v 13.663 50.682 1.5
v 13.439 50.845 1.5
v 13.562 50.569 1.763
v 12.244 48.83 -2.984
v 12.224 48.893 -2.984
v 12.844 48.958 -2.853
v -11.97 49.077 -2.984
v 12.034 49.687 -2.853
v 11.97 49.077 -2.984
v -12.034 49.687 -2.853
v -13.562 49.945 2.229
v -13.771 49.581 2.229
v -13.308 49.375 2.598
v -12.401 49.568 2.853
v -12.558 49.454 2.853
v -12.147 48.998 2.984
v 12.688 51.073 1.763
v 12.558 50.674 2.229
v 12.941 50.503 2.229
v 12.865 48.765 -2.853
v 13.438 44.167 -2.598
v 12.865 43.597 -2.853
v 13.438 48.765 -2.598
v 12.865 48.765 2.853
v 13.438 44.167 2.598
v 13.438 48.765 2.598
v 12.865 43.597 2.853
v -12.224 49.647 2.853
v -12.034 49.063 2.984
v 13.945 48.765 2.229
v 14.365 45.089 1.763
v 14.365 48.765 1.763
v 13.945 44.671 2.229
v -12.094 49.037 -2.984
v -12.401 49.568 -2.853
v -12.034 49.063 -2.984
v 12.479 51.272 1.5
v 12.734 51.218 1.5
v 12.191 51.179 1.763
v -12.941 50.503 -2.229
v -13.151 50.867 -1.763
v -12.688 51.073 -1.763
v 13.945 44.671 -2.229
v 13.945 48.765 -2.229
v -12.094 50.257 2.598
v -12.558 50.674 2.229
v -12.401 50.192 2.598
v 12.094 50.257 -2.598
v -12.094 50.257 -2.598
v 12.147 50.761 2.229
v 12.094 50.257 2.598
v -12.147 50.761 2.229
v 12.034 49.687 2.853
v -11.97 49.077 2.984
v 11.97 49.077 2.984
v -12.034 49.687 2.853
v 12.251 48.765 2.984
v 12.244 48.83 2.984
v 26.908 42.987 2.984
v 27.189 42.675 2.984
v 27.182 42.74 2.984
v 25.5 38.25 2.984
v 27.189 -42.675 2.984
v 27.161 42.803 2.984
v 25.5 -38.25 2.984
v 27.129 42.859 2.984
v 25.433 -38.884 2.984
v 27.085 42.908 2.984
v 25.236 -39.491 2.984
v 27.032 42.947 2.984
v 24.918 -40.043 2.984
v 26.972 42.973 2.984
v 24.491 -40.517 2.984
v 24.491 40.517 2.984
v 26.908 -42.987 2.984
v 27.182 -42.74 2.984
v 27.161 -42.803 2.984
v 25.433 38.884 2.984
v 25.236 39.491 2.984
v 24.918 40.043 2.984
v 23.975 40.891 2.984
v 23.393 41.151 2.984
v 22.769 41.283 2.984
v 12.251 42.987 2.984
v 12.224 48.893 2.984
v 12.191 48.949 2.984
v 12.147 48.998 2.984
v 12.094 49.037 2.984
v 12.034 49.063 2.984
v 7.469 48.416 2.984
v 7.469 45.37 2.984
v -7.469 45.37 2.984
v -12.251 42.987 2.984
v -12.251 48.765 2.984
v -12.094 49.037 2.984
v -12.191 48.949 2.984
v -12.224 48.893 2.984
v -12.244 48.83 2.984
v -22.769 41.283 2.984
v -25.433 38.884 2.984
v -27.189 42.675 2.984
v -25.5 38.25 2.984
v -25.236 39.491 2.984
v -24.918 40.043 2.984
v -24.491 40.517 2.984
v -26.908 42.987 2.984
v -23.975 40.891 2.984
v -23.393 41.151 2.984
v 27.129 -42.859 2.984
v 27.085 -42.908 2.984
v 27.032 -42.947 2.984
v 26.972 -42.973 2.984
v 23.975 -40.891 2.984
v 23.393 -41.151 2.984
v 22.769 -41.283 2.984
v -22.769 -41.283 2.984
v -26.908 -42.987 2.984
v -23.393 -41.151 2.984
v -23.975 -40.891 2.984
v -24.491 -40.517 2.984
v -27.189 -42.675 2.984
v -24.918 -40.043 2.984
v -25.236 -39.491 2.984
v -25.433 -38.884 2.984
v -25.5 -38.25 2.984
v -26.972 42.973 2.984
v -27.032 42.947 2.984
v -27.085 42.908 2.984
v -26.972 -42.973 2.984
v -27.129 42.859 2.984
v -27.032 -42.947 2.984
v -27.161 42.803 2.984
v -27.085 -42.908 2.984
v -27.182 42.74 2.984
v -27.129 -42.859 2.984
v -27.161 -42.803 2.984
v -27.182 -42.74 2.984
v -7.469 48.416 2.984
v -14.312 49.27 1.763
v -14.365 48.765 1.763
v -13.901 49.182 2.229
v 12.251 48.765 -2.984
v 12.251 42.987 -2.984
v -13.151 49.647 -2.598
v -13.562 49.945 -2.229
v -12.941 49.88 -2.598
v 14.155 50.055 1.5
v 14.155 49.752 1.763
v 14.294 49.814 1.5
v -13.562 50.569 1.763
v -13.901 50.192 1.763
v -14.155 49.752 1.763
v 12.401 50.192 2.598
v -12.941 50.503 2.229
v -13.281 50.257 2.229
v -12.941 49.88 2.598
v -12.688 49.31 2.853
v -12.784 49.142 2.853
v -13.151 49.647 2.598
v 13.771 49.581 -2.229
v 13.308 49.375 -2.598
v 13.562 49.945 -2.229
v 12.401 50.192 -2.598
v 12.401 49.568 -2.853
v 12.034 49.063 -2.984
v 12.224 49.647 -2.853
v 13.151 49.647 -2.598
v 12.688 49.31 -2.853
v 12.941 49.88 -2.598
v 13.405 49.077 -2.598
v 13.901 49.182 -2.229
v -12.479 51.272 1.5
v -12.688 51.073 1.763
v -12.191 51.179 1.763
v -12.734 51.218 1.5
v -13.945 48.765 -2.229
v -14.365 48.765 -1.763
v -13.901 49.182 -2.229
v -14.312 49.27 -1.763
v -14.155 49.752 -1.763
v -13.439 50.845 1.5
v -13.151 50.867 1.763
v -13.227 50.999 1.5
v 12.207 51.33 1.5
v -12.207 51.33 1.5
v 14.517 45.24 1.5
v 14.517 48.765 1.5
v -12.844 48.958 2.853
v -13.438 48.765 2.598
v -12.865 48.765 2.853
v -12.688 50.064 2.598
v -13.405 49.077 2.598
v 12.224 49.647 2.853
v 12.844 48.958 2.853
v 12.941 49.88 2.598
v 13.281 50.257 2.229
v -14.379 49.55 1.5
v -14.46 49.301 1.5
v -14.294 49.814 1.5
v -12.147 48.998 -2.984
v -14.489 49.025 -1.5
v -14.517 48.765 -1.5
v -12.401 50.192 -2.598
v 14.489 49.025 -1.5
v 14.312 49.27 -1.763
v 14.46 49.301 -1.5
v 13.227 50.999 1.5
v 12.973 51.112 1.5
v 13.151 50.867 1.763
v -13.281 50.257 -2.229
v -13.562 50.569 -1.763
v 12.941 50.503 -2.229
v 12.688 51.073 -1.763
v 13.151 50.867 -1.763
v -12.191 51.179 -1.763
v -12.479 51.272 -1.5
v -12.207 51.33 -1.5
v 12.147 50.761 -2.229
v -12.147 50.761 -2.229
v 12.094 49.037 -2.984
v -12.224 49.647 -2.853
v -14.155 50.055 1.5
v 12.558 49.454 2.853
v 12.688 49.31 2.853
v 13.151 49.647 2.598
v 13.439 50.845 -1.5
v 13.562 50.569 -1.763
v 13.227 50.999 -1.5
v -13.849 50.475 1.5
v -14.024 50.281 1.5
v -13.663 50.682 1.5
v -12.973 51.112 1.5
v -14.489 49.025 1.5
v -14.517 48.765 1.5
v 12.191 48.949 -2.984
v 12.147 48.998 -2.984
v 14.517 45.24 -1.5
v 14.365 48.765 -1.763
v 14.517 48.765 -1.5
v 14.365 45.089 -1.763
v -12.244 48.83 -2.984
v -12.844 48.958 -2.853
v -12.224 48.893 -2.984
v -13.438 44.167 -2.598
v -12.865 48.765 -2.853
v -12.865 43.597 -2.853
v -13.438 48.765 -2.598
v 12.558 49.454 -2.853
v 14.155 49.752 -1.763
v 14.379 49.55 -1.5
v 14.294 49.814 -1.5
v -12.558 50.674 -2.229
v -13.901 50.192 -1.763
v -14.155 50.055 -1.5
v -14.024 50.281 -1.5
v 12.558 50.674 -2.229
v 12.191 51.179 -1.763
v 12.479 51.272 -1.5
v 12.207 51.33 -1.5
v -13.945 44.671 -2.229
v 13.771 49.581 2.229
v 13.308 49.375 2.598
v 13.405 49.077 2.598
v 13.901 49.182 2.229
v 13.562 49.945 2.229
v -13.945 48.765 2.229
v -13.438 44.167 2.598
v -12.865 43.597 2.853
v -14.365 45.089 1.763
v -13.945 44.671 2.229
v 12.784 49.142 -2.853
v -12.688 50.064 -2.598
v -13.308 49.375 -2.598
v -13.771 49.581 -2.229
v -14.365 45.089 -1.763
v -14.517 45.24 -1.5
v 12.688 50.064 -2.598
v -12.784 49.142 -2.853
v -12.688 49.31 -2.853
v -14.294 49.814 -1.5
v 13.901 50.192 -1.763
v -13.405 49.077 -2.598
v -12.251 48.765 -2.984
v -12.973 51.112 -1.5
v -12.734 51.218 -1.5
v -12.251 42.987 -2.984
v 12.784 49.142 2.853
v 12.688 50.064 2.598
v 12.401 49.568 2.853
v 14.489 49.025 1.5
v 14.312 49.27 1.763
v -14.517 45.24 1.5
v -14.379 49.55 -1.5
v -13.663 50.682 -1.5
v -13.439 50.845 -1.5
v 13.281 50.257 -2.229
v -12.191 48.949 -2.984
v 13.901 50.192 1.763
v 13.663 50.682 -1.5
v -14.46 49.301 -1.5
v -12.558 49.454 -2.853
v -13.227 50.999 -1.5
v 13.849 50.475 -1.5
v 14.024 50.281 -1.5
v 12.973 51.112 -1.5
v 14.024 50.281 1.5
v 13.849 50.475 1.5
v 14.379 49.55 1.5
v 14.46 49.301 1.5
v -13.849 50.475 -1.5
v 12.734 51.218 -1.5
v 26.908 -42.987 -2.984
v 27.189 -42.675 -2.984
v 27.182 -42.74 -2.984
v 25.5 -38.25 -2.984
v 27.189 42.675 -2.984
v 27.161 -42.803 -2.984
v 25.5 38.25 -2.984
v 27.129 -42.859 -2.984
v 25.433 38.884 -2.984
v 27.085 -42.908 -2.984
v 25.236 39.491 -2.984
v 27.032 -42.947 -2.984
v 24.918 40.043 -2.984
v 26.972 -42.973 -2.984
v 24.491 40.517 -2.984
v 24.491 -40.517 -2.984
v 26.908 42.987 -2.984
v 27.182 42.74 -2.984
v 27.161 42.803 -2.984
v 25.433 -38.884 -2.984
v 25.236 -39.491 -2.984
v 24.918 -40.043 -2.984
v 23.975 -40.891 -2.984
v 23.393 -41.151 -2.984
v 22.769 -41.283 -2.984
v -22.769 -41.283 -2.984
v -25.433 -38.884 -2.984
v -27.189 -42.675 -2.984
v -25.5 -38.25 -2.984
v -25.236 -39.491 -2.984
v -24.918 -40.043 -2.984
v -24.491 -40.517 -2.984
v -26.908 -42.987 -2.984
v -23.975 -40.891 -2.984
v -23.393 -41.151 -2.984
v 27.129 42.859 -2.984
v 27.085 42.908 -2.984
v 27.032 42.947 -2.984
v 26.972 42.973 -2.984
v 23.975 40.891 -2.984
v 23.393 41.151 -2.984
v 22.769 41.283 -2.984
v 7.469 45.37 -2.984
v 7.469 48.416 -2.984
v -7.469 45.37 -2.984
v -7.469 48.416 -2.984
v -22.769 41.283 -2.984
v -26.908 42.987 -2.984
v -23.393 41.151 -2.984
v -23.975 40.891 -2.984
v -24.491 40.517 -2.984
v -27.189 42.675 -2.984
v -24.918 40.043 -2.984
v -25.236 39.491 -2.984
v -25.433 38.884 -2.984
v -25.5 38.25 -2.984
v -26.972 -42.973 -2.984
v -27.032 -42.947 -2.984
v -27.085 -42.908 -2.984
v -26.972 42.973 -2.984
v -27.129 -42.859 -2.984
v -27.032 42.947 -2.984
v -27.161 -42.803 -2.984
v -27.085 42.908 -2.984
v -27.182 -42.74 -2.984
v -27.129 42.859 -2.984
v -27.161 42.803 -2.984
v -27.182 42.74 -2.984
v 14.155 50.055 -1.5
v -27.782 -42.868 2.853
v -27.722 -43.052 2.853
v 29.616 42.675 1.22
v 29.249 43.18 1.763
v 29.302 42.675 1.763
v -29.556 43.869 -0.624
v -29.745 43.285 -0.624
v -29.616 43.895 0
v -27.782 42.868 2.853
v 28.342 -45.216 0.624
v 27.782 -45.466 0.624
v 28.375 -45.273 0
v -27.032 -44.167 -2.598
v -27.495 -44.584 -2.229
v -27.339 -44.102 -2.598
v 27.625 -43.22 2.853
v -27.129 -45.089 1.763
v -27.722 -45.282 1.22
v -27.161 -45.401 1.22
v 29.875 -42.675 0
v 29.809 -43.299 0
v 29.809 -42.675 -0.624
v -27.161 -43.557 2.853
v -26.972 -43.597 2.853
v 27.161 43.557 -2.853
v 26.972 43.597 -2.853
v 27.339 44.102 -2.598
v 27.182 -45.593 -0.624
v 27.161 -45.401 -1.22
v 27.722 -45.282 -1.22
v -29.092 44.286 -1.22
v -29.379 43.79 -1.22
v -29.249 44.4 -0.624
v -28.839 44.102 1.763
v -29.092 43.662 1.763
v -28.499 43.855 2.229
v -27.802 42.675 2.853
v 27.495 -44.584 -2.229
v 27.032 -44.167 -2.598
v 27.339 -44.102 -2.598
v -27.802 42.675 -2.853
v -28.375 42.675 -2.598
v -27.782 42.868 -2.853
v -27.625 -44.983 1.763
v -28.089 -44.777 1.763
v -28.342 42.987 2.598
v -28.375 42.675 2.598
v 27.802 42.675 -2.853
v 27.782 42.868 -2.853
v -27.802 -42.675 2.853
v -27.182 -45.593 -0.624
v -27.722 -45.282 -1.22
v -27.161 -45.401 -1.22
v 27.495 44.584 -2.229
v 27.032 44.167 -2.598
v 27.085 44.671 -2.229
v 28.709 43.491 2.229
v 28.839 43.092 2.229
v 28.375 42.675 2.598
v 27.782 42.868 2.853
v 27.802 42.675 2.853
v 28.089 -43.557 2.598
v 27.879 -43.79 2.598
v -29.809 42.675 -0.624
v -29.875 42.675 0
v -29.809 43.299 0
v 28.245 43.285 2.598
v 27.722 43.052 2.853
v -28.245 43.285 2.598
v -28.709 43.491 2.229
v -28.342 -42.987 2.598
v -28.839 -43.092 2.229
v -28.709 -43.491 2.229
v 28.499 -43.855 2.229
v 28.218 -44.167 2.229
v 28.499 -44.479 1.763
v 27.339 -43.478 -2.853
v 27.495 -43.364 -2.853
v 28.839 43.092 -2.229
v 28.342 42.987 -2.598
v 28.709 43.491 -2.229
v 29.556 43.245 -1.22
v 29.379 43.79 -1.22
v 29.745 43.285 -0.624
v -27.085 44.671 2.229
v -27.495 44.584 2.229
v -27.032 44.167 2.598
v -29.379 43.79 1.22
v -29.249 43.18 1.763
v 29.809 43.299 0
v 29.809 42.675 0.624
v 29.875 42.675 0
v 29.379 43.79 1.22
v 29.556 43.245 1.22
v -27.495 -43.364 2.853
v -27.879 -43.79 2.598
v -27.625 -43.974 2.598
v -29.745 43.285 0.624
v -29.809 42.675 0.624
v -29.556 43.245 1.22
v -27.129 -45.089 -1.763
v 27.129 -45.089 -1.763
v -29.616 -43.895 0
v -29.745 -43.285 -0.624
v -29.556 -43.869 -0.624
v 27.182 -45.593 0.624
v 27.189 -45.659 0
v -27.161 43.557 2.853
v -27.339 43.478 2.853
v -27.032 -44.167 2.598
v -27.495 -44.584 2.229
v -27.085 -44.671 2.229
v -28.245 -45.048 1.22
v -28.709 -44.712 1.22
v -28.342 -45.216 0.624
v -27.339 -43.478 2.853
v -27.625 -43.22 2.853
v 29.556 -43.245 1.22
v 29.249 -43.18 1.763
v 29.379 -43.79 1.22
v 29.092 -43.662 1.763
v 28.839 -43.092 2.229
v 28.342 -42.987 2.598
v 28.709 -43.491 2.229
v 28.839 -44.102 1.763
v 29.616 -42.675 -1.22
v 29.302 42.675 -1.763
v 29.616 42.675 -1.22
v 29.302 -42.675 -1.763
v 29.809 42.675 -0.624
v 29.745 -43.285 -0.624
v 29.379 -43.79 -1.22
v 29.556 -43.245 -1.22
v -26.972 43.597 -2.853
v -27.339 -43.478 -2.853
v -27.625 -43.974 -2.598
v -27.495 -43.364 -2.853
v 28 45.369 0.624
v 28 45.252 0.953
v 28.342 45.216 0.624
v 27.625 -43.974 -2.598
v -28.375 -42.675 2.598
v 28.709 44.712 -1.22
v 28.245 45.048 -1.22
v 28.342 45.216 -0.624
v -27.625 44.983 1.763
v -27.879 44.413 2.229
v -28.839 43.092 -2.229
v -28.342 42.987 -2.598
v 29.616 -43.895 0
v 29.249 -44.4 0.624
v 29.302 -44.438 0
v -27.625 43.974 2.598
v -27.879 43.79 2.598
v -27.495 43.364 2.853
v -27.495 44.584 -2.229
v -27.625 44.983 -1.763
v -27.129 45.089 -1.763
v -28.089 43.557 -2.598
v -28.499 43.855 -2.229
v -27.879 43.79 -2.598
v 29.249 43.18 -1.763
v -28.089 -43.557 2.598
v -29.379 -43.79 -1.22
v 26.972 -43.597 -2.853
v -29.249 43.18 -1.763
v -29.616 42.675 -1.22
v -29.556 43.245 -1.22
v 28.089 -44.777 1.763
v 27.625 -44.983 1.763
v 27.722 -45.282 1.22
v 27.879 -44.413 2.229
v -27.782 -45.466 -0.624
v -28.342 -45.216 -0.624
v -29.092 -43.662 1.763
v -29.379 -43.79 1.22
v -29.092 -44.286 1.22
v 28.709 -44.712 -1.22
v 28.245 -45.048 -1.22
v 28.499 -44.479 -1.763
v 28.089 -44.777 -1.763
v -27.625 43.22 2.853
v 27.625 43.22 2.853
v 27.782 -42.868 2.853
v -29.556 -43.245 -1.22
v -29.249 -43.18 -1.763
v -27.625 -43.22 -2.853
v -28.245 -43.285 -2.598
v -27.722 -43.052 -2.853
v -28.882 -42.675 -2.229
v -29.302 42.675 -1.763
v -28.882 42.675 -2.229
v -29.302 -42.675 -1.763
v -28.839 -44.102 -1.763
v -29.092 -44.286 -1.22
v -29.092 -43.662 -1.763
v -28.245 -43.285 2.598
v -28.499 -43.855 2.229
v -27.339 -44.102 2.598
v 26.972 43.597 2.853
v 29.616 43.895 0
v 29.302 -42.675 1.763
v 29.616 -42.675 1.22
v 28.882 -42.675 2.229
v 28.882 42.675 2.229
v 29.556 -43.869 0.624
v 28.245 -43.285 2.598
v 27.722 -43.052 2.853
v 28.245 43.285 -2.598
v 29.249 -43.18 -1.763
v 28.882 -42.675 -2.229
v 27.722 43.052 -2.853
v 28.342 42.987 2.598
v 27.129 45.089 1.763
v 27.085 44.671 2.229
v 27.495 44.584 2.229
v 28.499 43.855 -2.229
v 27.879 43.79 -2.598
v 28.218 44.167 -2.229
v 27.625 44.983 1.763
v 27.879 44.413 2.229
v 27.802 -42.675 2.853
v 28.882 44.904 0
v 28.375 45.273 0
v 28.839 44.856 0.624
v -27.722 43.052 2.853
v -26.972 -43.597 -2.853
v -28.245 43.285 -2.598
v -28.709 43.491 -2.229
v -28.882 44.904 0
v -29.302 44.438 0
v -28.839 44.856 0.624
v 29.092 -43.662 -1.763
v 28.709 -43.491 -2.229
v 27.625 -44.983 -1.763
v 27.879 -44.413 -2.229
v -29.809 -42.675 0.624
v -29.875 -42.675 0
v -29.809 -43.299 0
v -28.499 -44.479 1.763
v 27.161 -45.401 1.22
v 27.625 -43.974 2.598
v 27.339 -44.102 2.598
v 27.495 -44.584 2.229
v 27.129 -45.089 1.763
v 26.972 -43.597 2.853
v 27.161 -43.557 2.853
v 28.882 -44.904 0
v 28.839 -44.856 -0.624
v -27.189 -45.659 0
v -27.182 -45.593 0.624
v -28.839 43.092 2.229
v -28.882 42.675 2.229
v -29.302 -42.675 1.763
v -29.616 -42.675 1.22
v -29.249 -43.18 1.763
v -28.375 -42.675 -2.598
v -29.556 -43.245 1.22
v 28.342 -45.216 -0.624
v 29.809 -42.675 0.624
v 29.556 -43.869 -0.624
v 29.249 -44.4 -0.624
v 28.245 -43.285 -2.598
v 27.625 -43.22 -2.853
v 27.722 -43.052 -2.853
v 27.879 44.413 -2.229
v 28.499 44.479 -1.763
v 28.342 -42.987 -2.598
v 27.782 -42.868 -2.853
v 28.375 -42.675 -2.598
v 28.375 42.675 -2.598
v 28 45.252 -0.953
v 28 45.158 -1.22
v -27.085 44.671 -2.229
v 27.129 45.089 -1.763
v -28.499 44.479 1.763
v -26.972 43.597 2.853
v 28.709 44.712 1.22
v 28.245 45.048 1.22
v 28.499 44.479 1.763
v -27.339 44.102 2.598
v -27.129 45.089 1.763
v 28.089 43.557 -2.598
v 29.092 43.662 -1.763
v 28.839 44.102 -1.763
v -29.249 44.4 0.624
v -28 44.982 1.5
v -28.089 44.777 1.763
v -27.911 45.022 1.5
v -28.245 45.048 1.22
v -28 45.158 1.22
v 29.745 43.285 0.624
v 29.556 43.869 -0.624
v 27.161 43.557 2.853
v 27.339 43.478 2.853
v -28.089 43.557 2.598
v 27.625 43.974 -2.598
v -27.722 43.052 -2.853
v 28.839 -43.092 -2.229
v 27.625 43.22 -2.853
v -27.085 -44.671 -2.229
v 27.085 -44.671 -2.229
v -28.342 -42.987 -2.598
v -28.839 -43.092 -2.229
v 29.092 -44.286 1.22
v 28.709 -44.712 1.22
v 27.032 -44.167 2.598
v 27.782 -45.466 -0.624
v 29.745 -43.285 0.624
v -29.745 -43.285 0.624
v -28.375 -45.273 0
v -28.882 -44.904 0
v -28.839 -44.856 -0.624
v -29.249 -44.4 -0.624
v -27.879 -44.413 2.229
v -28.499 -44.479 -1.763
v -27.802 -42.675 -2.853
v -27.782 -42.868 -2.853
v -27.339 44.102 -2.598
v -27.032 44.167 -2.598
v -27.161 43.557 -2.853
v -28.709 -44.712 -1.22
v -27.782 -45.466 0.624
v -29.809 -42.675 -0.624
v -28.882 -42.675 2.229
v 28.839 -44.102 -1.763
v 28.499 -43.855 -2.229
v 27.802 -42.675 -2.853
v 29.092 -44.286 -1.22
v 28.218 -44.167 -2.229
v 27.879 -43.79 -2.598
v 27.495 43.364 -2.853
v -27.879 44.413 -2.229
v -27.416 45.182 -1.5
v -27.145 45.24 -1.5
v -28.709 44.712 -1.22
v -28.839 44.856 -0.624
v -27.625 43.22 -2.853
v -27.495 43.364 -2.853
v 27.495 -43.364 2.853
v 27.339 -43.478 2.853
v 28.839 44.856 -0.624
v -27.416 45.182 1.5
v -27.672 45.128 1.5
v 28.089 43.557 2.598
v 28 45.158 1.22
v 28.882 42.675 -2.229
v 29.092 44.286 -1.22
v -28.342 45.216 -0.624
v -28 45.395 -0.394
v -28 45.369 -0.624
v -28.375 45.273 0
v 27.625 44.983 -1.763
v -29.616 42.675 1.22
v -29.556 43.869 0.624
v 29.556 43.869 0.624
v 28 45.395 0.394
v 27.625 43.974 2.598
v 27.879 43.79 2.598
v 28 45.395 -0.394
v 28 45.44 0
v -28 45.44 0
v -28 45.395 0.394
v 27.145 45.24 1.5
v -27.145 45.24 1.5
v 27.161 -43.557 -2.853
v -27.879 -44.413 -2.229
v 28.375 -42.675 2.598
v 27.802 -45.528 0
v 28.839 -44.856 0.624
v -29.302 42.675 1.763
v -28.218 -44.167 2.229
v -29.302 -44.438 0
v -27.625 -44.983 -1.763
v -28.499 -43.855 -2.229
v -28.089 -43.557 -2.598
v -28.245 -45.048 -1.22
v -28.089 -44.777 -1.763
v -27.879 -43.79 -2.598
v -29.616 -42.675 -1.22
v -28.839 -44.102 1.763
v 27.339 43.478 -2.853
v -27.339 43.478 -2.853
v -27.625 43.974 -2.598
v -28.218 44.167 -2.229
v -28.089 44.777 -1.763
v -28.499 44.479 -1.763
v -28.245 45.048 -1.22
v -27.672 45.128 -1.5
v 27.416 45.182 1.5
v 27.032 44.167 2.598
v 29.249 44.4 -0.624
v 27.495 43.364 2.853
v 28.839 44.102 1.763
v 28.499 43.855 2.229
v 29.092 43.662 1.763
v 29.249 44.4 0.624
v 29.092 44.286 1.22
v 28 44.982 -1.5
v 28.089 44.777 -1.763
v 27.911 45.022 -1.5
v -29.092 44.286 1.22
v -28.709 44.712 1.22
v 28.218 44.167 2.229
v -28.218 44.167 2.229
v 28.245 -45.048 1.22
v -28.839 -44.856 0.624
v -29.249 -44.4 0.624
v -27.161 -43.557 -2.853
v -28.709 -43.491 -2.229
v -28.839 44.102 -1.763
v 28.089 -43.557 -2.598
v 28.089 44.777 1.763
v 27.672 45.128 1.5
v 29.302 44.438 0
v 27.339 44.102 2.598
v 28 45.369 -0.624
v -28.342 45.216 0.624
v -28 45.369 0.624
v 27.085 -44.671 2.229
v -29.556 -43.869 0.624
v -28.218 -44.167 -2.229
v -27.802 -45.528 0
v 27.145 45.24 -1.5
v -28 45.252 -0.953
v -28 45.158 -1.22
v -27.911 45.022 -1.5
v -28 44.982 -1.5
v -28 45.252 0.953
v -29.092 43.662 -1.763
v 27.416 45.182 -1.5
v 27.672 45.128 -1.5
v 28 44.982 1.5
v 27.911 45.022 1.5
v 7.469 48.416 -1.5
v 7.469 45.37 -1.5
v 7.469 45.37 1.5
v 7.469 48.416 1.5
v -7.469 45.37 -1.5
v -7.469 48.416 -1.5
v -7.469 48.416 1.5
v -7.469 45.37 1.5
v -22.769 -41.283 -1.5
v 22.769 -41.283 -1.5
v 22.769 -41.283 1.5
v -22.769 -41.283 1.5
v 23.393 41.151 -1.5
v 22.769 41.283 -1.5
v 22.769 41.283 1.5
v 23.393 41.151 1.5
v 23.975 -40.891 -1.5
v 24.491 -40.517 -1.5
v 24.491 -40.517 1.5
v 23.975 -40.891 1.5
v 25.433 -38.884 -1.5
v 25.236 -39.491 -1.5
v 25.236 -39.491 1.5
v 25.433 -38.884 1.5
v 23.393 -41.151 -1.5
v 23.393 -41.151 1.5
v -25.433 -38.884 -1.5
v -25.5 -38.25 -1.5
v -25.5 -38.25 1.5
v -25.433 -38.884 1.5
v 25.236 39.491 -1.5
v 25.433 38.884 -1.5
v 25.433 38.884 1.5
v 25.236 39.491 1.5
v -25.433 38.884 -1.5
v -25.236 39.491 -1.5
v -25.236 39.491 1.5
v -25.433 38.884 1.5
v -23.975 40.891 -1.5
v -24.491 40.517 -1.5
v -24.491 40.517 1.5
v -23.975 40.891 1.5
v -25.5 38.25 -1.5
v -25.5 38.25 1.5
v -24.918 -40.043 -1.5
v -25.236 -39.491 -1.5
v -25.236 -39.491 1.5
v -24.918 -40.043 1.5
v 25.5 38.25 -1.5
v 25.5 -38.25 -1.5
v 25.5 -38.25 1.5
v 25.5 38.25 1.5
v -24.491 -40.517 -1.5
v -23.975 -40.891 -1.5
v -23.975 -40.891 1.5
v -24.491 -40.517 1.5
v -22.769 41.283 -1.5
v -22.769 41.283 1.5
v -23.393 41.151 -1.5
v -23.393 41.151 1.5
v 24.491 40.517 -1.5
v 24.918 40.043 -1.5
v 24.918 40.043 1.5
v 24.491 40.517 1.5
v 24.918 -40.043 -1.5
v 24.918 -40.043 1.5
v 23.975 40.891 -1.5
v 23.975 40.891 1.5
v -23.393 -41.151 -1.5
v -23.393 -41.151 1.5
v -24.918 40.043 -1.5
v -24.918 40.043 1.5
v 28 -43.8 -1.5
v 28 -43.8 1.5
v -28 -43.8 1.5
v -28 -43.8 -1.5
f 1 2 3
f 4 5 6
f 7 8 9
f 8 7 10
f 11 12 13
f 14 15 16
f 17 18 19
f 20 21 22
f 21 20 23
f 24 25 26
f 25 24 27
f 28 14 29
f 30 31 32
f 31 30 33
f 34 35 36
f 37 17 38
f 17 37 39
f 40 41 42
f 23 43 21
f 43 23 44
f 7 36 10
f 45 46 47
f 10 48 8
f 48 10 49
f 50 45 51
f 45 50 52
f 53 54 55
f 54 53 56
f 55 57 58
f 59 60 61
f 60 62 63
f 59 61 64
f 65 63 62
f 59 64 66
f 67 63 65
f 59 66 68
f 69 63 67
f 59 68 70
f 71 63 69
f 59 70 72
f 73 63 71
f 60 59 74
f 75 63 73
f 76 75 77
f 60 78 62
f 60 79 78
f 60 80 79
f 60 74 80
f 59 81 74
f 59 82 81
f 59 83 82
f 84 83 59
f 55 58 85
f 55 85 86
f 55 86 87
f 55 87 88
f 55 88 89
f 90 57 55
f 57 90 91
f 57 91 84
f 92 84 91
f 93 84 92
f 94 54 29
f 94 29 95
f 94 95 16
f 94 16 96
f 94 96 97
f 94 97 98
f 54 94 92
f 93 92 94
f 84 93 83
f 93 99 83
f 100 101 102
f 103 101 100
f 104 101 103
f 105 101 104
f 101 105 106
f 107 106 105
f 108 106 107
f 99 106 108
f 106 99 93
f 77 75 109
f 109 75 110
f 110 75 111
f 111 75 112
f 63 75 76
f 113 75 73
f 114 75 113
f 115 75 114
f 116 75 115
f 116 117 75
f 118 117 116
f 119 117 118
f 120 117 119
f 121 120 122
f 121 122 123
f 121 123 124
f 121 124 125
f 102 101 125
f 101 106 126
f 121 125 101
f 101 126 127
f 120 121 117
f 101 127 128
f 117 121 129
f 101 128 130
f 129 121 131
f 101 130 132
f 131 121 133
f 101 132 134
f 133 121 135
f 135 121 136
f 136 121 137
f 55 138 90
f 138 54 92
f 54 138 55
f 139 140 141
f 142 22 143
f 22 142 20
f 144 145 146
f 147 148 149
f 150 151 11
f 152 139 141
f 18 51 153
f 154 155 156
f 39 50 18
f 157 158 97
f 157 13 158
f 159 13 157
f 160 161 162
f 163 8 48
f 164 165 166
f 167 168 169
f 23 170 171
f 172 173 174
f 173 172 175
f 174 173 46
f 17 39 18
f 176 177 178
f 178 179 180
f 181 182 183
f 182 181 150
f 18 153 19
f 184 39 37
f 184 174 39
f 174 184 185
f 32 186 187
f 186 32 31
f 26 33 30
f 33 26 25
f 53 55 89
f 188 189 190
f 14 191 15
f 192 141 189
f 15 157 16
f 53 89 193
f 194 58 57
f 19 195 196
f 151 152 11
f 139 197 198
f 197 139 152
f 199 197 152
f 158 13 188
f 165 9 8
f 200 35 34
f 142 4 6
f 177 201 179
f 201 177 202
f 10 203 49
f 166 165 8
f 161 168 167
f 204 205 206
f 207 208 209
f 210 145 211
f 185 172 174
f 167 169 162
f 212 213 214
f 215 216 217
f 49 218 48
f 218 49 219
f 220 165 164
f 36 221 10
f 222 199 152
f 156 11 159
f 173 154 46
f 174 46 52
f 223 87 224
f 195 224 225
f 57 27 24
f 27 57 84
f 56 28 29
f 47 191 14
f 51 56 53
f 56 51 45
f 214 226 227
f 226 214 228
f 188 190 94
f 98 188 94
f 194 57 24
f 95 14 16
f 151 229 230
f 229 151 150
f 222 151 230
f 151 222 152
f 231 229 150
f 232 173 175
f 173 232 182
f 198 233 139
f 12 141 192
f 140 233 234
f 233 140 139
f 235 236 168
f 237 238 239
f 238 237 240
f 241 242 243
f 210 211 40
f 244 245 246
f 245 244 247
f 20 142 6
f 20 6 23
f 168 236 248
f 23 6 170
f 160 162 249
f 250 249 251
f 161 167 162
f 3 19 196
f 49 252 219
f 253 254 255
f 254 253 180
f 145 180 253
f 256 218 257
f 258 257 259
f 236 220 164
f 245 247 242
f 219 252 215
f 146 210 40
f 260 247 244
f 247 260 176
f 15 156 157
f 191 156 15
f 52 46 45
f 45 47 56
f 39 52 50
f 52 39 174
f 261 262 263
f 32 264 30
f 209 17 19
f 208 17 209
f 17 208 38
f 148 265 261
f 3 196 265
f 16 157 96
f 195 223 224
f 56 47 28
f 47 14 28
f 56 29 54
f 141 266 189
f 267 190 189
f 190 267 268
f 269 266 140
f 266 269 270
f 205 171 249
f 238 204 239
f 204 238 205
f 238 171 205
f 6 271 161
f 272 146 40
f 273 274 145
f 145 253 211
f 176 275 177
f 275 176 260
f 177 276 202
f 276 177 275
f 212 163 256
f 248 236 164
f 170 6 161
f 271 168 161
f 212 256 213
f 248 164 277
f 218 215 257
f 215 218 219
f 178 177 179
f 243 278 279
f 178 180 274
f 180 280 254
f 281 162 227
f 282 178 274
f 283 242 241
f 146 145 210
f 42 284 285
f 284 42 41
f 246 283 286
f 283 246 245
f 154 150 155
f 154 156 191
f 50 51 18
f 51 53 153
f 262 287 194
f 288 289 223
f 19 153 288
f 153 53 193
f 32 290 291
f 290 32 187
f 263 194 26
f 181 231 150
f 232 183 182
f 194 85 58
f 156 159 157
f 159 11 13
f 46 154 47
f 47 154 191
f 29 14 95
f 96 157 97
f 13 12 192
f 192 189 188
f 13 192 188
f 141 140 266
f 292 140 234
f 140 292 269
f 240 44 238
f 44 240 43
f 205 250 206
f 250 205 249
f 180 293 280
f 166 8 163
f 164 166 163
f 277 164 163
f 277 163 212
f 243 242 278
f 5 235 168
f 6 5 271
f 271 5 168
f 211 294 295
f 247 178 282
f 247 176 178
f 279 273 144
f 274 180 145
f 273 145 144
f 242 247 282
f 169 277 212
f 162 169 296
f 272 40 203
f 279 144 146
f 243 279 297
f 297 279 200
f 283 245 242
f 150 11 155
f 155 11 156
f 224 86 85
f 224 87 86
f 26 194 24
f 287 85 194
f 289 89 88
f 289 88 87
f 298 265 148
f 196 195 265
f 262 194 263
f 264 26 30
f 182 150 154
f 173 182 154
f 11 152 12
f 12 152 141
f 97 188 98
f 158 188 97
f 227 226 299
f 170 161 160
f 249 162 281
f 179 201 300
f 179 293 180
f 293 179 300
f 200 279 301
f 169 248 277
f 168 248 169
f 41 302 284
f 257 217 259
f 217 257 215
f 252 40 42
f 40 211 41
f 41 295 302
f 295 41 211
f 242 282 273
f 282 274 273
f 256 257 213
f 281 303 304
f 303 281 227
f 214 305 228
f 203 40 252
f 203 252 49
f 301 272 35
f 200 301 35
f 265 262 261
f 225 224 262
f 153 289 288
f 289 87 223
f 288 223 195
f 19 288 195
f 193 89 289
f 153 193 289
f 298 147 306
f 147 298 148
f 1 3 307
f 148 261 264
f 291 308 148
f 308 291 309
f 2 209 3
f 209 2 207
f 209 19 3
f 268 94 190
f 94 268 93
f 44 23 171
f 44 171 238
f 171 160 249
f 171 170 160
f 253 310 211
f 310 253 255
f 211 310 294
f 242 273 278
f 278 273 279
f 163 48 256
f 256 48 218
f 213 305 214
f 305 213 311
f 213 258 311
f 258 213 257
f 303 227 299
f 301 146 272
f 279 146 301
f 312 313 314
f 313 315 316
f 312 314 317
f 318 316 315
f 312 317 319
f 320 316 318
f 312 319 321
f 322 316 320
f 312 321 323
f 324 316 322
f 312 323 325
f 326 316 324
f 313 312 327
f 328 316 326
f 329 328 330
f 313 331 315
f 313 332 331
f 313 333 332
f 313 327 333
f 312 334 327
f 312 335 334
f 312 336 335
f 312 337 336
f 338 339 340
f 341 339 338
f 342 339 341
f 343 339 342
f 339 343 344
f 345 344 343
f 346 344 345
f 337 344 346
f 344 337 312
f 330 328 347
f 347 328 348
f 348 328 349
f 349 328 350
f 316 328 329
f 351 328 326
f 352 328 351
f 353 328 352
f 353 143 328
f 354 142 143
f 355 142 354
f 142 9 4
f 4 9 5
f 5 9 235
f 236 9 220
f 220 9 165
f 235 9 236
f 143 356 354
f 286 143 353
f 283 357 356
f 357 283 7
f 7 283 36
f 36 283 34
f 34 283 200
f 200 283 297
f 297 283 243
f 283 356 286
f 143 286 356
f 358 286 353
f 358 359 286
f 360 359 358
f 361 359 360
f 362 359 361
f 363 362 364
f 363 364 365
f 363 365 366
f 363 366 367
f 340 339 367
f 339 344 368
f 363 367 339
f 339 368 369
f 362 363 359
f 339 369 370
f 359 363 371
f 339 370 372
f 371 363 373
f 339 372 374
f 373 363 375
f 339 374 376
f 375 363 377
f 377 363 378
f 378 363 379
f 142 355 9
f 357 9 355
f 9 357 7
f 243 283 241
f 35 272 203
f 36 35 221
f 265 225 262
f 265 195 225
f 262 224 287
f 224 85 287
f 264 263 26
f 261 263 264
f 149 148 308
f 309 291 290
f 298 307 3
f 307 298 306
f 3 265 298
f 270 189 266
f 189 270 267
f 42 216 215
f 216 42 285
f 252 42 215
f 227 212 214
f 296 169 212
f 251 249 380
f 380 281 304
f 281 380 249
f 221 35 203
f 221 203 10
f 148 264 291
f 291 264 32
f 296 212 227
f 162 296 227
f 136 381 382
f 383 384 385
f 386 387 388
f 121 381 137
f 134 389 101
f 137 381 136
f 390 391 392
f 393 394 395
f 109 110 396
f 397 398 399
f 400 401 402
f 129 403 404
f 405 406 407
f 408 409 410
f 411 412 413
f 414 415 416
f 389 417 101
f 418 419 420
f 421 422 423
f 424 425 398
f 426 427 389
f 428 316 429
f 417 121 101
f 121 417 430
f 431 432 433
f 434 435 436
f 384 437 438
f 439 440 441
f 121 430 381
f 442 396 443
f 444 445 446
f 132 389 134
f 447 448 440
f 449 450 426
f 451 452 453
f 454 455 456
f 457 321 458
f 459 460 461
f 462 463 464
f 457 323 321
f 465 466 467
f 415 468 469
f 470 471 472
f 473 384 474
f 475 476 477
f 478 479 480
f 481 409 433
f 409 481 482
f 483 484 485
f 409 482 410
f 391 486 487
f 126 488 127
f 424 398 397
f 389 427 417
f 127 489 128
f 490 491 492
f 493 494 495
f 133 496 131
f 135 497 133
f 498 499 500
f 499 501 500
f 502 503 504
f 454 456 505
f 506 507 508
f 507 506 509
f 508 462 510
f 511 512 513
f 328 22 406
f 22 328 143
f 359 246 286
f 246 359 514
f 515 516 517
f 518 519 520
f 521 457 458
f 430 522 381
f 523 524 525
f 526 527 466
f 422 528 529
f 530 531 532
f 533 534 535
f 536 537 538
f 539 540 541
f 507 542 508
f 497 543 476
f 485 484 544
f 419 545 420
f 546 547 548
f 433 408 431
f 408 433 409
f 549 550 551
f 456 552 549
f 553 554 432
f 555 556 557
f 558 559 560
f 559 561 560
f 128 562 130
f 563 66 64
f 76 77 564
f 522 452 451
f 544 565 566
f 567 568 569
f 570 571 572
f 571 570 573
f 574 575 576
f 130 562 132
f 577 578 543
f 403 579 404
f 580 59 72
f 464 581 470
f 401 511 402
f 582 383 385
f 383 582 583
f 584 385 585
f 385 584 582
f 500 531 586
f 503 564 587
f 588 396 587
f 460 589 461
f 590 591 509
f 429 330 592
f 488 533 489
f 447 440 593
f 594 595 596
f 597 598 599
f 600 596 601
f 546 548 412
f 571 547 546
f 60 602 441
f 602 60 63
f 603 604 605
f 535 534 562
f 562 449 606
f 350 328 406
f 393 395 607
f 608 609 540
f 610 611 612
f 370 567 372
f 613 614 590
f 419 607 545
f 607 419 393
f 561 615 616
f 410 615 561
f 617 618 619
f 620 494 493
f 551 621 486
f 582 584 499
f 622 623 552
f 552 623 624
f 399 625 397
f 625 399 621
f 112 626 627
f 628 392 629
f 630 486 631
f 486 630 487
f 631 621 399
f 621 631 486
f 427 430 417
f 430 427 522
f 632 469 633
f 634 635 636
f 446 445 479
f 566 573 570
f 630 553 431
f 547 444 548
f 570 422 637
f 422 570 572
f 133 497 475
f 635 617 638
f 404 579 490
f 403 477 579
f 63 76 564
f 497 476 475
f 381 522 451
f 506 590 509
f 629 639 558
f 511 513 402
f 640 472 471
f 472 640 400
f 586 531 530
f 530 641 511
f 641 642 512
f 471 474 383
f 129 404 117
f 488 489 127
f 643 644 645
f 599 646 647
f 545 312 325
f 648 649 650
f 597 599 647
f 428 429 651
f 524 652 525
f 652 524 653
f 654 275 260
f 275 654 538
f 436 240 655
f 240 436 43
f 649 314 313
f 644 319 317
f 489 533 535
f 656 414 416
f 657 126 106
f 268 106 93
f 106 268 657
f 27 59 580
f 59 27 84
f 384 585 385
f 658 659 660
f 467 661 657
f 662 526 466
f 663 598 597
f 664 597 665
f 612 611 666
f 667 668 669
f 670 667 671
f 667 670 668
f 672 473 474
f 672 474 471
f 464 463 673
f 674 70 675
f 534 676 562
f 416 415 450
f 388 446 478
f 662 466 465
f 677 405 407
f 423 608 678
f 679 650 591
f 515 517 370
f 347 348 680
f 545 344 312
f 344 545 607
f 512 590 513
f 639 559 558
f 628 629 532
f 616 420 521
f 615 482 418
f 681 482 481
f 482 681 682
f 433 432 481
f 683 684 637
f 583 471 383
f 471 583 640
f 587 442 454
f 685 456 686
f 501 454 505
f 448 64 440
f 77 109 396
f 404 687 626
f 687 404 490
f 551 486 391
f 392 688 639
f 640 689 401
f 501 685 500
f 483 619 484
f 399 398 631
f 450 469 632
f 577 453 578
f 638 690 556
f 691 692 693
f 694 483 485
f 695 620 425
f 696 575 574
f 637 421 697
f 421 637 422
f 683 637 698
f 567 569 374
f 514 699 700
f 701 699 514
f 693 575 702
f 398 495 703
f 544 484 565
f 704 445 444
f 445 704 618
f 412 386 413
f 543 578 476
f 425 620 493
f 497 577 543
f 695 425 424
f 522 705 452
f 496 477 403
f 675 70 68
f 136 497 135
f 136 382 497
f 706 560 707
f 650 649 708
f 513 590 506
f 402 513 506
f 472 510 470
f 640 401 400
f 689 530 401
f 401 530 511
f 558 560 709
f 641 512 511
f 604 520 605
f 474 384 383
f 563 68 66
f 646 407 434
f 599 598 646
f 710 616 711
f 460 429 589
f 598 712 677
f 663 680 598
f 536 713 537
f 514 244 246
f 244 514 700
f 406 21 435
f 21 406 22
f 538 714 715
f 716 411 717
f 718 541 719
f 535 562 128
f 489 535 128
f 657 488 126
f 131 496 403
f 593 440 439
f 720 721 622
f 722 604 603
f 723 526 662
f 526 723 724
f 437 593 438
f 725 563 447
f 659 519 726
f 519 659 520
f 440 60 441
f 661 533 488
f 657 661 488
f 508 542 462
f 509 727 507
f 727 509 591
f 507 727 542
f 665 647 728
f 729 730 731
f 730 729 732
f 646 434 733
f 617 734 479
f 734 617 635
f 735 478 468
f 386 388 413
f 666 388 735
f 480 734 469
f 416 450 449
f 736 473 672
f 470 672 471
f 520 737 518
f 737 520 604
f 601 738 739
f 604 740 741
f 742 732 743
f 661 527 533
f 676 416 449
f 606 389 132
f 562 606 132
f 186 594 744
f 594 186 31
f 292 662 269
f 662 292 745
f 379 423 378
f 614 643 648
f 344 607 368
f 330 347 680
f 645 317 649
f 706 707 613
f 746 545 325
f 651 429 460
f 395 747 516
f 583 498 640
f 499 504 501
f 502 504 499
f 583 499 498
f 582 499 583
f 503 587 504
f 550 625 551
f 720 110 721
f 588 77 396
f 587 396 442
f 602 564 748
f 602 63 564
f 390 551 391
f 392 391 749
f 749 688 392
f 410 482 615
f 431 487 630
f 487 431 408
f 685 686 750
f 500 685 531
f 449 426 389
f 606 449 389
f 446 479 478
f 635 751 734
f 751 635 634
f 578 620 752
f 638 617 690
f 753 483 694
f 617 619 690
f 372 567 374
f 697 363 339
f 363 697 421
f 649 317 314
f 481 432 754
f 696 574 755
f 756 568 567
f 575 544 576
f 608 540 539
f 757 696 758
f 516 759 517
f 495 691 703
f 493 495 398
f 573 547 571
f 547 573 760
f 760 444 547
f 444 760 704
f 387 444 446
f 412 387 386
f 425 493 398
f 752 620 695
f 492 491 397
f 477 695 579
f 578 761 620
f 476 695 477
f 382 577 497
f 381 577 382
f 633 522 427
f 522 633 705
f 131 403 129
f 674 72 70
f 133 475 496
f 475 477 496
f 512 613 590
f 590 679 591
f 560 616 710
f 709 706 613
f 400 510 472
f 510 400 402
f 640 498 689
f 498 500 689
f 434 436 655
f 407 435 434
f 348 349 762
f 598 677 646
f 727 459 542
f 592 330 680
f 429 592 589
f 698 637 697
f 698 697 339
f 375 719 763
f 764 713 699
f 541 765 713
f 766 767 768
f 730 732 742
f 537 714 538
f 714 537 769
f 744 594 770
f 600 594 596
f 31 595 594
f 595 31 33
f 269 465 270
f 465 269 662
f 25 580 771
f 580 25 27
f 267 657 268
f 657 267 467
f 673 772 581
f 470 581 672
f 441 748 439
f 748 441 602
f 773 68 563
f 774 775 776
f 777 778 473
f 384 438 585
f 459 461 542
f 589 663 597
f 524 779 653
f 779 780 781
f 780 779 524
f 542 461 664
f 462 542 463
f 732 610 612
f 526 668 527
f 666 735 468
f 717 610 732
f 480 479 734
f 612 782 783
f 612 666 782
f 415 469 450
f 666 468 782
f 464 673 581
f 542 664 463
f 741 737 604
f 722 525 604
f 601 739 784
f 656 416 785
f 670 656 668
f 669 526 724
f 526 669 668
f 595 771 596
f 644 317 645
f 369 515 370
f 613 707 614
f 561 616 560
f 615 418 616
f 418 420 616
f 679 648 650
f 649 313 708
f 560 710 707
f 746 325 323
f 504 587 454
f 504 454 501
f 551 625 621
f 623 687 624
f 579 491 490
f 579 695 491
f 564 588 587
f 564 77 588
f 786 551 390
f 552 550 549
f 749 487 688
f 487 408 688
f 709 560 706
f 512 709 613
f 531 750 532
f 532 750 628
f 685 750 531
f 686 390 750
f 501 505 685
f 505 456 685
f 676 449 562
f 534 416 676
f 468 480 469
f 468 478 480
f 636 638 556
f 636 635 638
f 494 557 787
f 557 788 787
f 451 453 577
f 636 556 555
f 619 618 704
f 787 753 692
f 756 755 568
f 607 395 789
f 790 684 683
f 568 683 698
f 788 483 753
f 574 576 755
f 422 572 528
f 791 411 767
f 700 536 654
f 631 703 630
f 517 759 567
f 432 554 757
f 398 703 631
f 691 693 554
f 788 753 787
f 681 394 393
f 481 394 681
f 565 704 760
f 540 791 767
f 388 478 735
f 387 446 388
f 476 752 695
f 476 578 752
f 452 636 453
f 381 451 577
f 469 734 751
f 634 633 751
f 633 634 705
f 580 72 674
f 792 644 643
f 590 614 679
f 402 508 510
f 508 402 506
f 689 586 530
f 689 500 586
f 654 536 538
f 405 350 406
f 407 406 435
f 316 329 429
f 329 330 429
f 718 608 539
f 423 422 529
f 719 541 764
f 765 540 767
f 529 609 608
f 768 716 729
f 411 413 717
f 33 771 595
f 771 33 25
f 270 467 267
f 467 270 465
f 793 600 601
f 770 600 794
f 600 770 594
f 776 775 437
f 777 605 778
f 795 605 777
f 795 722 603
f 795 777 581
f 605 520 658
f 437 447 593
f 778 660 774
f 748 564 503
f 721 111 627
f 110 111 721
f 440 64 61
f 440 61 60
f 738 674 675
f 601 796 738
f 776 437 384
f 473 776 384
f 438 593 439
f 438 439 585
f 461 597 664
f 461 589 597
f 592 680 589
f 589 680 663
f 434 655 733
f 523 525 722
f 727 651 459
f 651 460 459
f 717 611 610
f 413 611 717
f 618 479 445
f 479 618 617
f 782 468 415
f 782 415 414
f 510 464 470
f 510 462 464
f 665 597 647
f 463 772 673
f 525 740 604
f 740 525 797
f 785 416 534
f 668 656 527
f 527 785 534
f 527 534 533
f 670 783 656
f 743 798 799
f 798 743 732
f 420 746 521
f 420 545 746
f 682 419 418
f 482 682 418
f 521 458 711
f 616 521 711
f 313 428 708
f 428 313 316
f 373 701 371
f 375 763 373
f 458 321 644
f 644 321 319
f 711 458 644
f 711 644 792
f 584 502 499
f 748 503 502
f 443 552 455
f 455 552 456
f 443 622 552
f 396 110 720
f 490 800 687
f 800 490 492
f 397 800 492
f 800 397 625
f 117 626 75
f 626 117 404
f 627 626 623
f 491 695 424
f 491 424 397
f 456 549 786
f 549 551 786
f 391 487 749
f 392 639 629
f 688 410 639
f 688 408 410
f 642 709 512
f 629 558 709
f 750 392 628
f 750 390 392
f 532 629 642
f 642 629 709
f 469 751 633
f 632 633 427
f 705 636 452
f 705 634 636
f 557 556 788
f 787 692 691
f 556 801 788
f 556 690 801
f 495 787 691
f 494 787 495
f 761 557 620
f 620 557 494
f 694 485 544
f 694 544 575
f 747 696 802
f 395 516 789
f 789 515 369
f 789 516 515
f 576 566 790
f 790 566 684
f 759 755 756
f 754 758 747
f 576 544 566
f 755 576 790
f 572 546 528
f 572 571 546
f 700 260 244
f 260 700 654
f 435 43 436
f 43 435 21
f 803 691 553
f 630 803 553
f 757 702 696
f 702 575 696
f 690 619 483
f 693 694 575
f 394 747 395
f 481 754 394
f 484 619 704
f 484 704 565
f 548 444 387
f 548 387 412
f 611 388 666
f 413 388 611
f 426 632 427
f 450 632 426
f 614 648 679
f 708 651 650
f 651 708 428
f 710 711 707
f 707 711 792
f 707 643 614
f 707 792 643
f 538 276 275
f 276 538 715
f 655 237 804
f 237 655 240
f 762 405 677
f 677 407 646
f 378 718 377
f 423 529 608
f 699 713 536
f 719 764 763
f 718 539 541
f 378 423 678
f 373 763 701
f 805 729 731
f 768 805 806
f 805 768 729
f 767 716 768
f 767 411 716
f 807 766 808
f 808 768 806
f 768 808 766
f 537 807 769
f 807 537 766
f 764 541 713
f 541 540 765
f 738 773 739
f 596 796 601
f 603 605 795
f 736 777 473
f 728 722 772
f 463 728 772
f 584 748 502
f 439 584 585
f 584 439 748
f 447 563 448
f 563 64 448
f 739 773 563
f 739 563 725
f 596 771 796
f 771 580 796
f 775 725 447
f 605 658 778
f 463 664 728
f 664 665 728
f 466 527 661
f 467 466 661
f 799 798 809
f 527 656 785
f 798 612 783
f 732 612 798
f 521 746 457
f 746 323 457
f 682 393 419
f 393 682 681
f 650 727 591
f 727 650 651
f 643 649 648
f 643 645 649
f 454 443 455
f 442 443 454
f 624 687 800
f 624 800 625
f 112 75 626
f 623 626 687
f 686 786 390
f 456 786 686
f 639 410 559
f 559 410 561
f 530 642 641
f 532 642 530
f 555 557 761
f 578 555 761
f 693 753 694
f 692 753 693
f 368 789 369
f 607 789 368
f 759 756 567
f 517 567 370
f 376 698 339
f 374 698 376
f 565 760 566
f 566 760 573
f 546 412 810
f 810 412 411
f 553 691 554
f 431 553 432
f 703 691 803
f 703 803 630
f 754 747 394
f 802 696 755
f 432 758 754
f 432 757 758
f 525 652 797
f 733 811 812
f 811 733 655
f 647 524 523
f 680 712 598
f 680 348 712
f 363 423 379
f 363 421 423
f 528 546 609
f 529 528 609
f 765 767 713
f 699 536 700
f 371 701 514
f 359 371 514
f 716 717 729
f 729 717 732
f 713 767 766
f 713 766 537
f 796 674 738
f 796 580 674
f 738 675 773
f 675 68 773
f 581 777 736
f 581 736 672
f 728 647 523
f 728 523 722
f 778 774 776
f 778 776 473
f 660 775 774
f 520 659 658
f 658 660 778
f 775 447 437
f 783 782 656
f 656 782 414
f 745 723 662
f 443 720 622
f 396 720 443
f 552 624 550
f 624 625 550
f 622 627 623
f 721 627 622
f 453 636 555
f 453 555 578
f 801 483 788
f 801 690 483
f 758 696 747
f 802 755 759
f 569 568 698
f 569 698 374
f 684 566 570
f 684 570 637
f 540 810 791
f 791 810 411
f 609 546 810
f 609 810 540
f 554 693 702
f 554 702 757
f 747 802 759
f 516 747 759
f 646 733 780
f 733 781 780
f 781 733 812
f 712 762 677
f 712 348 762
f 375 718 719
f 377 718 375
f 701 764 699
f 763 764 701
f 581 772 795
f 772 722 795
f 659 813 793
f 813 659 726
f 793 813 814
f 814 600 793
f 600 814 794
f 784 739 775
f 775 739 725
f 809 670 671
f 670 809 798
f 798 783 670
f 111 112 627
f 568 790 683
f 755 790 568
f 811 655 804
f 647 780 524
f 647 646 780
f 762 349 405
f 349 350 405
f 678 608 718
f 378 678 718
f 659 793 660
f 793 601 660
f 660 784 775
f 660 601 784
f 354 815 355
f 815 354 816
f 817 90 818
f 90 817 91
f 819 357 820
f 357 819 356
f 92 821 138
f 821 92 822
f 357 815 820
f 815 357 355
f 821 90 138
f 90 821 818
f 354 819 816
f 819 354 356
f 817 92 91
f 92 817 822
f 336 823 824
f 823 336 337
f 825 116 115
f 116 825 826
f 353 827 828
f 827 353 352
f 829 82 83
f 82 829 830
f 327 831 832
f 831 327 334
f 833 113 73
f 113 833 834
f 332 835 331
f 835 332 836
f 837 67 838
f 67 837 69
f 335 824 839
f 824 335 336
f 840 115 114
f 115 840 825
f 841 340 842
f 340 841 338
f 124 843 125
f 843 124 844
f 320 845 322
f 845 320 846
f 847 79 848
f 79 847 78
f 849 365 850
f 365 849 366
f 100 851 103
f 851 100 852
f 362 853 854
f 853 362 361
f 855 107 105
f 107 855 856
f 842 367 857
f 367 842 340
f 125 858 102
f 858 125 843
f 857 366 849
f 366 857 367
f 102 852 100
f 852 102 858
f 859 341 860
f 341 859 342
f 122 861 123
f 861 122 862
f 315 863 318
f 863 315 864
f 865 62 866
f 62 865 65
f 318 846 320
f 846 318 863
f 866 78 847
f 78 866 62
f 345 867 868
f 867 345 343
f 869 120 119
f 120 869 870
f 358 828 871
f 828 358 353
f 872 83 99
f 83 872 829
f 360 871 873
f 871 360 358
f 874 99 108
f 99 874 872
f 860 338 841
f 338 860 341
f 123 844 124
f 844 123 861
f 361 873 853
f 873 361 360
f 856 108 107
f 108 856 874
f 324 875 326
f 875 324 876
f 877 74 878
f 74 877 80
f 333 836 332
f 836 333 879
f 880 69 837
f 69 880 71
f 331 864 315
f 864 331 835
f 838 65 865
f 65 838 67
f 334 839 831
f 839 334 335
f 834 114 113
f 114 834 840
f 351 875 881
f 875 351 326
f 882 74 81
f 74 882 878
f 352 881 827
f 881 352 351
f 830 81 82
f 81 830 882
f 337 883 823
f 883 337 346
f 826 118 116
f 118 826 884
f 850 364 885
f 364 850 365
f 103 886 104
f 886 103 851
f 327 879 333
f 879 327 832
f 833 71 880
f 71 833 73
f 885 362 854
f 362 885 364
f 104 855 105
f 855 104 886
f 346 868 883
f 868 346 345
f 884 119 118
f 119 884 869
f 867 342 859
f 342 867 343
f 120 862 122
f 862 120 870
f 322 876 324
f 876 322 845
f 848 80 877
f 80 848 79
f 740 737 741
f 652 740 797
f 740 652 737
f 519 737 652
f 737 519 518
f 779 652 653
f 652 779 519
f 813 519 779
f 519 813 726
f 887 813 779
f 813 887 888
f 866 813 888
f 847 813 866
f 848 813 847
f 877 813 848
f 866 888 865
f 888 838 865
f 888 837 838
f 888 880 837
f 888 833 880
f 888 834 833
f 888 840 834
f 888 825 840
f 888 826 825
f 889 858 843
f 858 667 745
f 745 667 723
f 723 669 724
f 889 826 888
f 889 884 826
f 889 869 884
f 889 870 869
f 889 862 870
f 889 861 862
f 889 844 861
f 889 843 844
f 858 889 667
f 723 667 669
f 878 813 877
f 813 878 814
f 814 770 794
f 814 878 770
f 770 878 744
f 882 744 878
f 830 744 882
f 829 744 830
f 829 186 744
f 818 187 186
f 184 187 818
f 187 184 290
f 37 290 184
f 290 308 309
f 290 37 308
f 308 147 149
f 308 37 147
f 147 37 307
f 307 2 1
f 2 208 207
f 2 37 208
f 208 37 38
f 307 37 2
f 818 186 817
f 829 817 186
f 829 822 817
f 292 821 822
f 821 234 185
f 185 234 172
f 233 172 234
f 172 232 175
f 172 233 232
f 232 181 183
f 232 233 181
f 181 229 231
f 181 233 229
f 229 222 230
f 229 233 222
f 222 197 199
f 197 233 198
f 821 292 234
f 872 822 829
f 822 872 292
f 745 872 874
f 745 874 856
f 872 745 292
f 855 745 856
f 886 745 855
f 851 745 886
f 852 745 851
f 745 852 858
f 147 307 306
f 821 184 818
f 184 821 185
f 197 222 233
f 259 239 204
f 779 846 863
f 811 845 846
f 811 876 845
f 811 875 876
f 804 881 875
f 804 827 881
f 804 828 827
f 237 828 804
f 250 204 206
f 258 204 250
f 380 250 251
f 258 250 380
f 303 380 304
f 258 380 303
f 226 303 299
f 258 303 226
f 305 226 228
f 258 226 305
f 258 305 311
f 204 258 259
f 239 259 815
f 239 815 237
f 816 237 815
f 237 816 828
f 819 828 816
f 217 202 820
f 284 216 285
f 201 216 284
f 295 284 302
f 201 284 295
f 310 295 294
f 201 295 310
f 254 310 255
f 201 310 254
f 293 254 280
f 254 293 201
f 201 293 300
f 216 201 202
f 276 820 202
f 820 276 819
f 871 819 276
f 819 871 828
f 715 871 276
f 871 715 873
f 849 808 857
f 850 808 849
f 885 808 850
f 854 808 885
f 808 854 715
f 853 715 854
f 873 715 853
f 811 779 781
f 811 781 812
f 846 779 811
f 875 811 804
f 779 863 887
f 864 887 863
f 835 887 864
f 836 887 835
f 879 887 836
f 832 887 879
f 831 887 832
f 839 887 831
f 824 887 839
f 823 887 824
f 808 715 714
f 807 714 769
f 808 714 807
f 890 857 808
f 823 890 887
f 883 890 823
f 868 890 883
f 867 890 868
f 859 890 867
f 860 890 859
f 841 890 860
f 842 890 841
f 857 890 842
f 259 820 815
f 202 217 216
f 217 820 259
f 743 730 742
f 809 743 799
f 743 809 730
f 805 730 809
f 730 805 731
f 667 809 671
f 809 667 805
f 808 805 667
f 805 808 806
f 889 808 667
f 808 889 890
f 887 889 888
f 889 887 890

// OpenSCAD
// Badge dimensions.
badge_width = 54;  // mm.
badge_height = 85.6;  // mm.
badge_depth = 2.5;  // mm. thickness of badge.

// Shapeways model tolerance.
// Stainless steel edges must be at least 1.5 mm thick.
tolerance = 1.5; // mm.

// Window is the empty area that makes the badge visible. To hold badge in
// place the window should be *smaller* than the actual badge dimensions.
// Cover left & right, and top & bottom by 'tolerance' mm.
window_width = badge_width - 2*tolerance;
window_height = badge_height - 2*tolerance;
// window_depth is assigned below.

// Slot is the inner gap where the badge will slide into frame.
// The slot should be *slightly* larger than the badge.
// Add 1mm on left & right, and top & bottom. (does not include badge clip).
slot_width = badge_width + 2;
slot_height = badge_height + 2;
slot_depth = badge_depth + 0.5;  // pretty tight. but should be enought.

// Outside is the external dimension of the entire frame.
// The additional padding (.75) is for volume lost by the beveled edges.
// Add tolerance on left & right, top & bottom.
outside_width = slot_width + 2*tolerance + 0.75;
outside_height = slot_height + 2*tolerance + 0.75;
outside_depth = slot_depth + 2*tolerance;  // the bare minimum wall size.

// Now that we have defined outside_depth, we can assign window_depth.
// Make window_depth a little larger to guarantee a complete removal of frame
// without aliasing due to floating point precision.
window_depth = outside_depth + 0.1;

// The badge also has a clip on top. This is the height of the clip.
clip_height = outside_height/15;
// clip_height = (outside_width - window_width) / 2 + 1;


// Creates a "beveled cube" of dimensions width x height x depth with beveled
// edges of radius depth/2. All dimensions are preserved, but volume is less
// due to beveled edges. The entire shape is centered at the origin: 0, 0, 0.
module beveledcube(width, height, depth) {
  r = depth/2;
  // Set local w and h so that given width and height are preserved.
  w = width - depth;  // radius will be added twice on left and right.
  h = height - depth;  // radius will be added twice on top and bottom.

  // creates a convex hull around these four spheres.
  hull() {
    translate([-w/2, -h/2, 0]) sphere(r, $fs=0.01);
    translate([ w/2, -h/2, 0]) sphere(r, $fs=0.01);
    translate([-w/2,  h/2, 0]) sphere(r, $fs=0.01);
    translate([ w/2,  h/2, 0]) sphere(r, $fs=0.01);
  }
}

// Creates a "cylinder cube" of dimensions width x height x depth with beveled
// edges of radius depth/2 only on the width and height dimensions. All
// dimensions are preserved, but volume is less due to beveled edges. The
// entire shape is centered at the origin: 0, 0, 0.
module cylindercube(width, height, depth) {
  r = depth/2;
  // Set local w and h so that given width and height are preserved.
  w = width - depth;  // radius will be added twice on left and right.
  h = height - depth;  // radius will be added twice on top and bottom.

  // creates a convex hull around these four spheres.
  hull() {
    translate([-w/2, -h/2, 0]) cylinder(h=depth, r=r, center=true, $fs=0.01);
    translate([ w/2, -h/2, 0]) cylinder(h=depth, r=r, center=true, $fs=0.01);
    translate([-w/2,  h/2, 0]) cylinder(h=depth, r=r, center=true, $fs=0.01);
    translate([ w/2,  h/2, 0]) cylinder(h=depth, r=r, center=true, $fs=0.01);
  }
}

// Creates a badge shape with beveled edges and top clip area.
// The top clip will extend clip_height above height, with a hole through the
// middle. 
module badgeframe(width, height, depth, clip_height) {
  difference() {
    union() { 
      // Badge clip on top.
      // Create a smaller beveledcube of clip_height size. Clip height is
      // doubled but only half will extend above frame. The overlap helps blend
      // the two shapes together.
      translate([0, height/2, 0]) beveledcube(width/2, clip_height*2, depth);

      // Badge frame.
      beveledcube(width, height, depth);
    }

    // Cut a hold in the clip, half as large as clip_height.
    translate([0, height/2+clip_height/5, 0]) {
        cube(size=[width/4, clip_height/2, depth], center=true);
    }
  } 
}

// Logically, the badge holder consists of three intersecting shapes.
// 1) The 'badgeframe' defines the volume of the entire frame.
// 2) The window cylindercube is subtracted from the badgeframe shape
//    to create a portal to view the badge.
// 3) The slot cube is subtracted from within the badgeframe to
//    create a space for the badge to fit.

scale=1.25;
difference() {
  // outside shape.
  badgeframe(outside_width, outside_height, outside_depth, clip_height);

  // cut out the viewing window from the center.
  cylindercube(window_width, window_height, window_depth);

  // cut out the slot within the frame.
  cube(size = [slot_width,slot_height,slot_depth], center = true);

  // finish cutting the slot through the rest of the badge clip.
  translate([0,20,0])
      cube(size = [slot_width,slot_height,slot_depth], center = true);
}
